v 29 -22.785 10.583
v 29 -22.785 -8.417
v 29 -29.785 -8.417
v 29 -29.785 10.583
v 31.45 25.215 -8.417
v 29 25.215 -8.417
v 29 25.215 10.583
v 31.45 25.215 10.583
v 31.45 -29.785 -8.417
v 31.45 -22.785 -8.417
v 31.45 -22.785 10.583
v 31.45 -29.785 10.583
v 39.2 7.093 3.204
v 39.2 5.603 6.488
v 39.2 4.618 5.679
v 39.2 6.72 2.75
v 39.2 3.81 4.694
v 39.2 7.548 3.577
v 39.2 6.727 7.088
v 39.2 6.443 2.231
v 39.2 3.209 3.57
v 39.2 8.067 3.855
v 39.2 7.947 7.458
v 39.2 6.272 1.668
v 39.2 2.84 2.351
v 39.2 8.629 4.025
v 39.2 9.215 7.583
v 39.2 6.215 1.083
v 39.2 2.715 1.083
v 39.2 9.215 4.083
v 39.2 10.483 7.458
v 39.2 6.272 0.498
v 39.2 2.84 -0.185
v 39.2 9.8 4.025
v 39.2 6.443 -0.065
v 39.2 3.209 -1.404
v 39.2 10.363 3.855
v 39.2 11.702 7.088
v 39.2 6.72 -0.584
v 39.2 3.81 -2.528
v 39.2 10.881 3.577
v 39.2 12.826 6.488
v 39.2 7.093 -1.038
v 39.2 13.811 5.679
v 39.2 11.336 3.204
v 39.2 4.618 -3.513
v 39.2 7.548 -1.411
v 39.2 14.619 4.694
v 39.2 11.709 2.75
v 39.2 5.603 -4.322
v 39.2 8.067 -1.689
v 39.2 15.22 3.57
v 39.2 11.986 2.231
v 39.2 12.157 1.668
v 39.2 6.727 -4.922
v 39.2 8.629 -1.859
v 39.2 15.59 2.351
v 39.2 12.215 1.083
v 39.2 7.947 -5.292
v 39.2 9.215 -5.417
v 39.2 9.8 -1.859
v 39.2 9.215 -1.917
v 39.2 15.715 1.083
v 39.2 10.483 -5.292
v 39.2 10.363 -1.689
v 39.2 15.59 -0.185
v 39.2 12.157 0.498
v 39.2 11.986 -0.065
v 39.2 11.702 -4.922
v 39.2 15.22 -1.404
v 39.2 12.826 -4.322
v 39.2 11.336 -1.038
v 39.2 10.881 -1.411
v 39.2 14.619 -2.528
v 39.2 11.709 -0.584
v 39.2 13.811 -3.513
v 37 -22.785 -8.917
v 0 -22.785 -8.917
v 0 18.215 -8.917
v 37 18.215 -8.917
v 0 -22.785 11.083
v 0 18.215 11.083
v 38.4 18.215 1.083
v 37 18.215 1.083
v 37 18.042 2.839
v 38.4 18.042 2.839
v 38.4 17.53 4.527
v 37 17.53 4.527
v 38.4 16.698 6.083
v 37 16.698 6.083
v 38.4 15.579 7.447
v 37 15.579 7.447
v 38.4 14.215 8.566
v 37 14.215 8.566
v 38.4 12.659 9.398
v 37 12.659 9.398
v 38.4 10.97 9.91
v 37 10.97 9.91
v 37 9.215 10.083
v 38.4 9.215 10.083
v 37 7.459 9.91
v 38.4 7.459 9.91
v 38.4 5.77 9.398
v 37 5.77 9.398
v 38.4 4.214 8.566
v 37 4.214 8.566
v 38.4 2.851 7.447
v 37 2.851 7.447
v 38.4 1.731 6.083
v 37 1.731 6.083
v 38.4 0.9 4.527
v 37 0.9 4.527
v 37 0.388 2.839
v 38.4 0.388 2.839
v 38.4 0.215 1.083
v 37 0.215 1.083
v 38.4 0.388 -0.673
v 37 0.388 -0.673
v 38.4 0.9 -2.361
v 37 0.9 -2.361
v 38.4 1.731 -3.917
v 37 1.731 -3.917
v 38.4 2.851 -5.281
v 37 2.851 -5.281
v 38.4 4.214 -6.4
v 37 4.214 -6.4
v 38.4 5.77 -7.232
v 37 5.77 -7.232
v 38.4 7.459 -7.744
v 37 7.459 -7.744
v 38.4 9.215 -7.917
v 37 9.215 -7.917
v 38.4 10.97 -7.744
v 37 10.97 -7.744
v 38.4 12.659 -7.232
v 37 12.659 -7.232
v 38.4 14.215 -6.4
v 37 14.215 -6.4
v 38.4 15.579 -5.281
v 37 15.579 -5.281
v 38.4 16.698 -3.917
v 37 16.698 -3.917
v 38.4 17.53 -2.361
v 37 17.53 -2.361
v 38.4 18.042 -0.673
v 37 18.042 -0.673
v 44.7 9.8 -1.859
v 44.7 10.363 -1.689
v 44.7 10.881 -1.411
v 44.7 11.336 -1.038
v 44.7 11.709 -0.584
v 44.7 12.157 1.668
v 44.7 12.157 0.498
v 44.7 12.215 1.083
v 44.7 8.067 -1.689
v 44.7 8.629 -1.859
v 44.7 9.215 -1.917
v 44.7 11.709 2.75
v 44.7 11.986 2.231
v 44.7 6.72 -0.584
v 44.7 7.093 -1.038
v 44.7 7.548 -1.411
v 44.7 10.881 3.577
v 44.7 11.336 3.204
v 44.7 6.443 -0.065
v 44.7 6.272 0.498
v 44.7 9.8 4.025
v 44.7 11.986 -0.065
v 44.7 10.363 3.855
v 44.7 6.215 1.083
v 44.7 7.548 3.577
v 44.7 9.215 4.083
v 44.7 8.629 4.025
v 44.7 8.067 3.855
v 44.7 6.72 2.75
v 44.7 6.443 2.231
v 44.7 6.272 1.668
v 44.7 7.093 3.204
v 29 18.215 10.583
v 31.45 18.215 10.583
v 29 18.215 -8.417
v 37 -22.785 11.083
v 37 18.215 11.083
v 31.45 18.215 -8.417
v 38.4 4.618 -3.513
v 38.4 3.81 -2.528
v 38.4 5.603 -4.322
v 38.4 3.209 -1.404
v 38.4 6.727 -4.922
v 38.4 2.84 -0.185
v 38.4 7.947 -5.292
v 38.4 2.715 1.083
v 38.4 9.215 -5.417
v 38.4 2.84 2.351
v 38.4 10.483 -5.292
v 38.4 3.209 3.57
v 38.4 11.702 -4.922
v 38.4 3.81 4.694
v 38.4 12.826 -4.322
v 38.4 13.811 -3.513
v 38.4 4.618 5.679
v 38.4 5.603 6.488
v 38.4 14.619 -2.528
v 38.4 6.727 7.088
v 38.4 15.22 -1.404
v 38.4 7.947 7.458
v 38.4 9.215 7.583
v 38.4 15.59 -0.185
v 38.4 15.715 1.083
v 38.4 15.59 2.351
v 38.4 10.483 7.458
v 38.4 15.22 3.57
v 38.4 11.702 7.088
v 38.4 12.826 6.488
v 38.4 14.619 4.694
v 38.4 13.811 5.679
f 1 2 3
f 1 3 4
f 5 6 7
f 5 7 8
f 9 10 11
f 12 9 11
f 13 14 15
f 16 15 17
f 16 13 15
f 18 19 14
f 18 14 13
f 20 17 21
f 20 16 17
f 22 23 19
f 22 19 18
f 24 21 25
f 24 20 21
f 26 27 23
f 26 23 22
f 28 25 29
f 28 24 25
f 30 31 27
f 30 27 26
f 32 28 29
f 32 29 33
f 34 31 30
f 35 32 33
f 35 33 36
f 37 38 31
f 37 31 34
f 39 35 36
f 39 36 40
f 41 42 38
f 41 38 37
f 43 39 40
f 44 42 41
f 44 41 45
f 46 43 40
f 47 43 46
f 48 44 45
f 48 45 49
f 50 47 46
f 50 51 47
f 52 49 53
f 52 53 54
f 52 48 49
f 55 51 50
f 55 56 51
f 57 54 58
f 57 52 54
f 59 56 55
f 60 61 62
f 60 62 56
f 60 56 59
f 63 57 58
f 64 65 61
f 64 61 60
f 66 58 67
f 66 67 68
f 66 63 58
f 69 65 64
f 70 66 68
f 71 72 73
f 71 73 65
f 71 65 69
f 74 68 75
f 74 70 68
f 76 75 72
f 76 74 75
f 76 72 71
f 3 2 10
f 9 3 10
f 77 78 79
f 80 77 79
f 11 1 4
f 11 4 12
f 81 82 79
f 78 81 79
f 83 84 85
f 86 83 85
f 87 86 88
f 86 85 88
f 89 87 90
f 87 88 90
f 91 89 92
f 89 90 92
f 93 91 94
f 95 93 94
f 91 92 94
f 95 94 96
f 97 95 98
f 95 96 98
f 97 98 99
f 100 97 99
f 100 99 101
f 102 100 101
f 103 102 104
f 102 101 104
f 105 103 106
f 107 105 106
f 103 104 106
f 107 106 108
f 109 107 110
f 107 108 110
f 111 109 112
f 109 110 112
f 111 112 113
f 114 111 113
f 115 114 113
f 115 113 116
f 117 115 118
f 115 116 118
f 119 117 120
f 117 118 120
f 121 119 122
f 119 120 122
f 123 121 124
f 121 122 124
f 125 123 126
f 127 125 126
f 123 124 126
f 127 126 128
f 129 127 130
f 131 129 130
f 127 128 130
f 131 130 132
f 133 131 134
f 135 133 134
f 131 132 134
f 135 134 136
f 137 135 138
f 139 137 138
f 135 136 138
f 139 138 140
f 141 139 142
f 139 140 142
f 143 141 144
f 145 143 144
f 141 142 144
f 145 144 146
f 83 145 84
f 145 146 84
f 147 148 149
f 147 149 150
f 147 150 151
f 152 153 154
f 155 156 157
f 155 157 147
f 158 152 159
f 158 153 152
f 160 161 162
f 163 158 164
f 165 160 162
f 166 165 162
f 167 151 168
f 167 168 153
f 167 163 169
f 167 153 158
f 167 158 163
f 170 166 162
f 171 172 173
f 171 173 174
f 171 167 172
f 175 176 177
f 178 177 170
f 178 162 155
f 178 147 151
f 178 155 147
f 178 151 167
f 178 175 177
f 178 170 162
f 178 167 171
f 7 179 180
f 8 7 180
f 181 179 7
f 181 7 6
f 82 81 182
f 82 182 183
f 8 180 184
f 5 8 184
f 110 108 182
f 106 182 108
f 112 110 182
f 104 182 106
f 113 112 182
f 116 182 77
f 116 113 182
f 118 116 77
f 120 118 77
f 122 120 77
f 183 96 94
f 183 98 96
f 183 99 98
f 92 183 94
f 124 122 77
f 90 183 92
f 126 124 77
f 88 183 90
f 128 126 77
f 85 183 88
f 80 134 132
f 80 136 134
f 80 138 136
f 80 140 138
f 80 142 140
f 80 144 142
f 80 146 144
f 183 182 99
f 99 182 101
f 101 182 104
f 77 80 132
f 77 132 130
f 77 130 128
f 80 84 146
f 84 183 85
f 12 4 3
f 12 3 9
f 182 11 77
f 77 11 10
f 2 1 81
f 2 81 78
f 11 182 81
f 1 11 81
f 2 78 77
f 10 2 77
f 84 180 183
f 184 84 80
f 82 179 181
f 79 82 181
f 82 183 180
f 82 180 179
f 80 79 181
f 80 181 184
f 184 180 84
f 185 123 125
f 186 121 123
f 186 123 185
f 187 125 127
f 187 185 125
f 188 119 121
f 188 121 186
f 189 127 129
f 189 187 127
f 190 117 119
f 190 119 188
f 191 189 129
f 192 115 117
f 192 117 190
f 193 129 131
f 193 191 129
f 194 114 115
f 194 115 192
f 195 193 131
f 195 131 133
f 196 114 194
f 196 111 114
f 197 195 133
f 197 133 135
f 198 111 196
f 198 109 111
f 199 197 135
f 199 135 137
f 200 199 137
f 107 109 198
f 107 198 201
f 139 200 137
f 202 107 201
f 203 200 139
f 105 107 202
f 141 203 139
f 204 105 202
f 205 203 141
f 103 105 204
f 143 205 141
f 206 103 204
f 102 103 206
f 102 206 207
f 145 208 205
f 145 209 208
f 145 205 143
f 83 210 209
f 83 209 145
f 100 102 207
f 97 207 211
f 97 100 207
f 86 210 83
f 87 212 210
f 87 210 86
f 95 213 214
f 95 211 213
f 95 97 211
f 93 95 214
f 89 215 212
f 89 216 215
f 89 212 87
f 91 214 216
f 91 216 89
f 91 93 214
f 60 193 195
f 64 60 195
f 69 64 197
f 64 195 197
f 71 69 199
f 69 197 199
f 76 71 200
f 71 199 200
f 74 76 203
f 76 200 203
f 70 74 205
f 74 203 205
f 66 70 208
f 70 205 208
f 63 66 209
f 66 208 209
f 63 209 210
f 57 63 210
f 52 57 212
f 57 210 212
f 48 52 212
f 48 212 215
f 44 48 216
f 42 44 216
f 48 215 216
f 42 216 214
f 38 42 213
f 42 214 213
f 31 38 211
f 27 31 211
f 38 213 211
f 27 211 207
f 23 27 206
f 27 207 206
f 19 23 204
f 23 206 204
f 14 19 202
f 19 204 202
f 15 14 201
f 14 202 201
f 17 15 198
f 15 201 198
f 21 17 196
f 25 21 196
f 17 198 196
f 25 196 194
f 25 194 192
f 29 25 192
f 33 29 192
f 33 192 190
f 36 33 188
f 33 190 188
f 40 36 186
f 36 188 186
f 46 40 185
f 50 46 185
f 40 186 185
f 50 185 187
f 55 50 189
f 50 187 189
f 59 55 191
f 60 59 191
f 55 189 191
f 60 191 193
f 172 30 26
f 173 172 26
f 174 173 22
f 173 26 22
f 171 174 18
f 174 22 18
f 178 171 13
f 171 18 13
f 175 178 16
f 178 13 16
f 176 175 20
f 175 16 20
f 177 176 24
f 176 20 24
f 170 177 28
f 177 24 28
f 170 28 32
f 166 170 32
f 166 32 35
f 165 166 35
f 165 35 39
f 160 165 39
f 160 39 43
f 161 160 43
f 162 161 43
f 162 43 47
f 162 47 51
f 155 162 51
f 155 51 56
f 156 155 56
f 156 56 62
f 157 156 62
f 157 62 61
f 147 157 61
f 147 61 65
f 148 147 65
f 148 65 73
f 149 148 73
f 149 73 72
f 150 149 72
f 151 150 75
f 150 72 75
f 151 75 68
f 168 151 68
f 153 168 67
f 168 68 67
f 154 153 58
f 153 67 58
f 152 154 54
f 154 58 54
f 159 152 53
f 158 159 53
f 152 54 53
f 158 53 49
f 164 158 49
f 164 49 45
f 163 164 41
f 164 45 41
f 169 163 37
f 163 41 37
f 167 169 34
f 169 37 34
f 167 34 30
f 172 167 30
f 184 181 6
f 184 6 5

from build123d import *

# Parameters (mm, degrees)
SKETCH_1_W      = 20
SKETCH_1_H      = 41
EXTRUDE_1_DEPTH = 37
SKETCH_2_W      = 2.45
SKETCH_2_H      = 19
EXTRUDE_2_DEPTH = 7
SKETCH_3_W      = 2.45
SKETCH_3_H      = 19
EXTRUDE_3_DEPTH = 7
SKETCH_4_R      = 3
EXTRUDE_4_DEPTH = 7.7
SKETCH_5_R      = 9
EXTRUDE_5_DEPTH = 1.4
SKETCH_7_R      = 6.5
EXTRUDE_6_DEPTH = 0.8


with BuildPart() as part:
    # 草圖1 → 填料-伸長1 (new body)
    with BuildSketch(Plane(origin=(0, 0, 0), x_dir=(0, 0, -1), z_dir=(1, 0, 0))):
        with Locations((-1.083039195, -2.285391089)):
            Rectangle(SKETCH_1_W, SKETCH_1_H)
    extrude(amount=EXTRUDE_1_DEPTH)

    # 草圖2 → 填料-伸長2 (add)
    with BuildSketch(Plane(origin=(0, 18.214608911, 0), x_dir=(1, 0, 0), z_dir=(0, 1, 0))):
        with Locations((30.225, -1.083039195)):
            Rectangle(SKETCH_2_W, SKETCH_2_H)
    extrude(amount=EXTRUDE_2_DEPTH)

    # 草圖3 → 填料-伸長3 (add)
    with BuildSketch(Plane.XZ.offset(22.785391089)):
        with Locations((30.225, 1.083039195)):
            Rectangle(SKETCH_3_W, SKETCH_3_H)
    extrude(amount=EXTRUDE_3_DEPTH)

    # 草圖4 → 填料-伸長4 (add)
    with BuildSketch(Plane(origin=(37, 0, 0), x_dir=(0, 0, -1), z_dir=(1, 0, 0))):
        with Locations(Location((-1.083039195, 9.214608911, 0), (0, 0, 180))):
            Circle(SKETCH_4_R)
    extrude(amount=EXTRUDE_4_DEPTH)

    # 草圖5 → 填料-伸長5 (add)
    with BuildSketch(Plane(origin=(37, 0, 0), x_dir=(0, 0, -1), z_dir=(1, 0, 0))):
        with Locations(Location((-1.083039195, 9.214608911, 0), (0, 0, 90))):
            Circle(SKETCH_5_R)
    extrude(amount=EXTRUDE_5_DEPTH)

    # 草圖7 → 填料-伸長6 (add)
    with BuildSketch(Plane(origin=(38.4, 0, 0), x_dir=(0, 0, -1), z_dir=(1, 0, 0))):
        with Locations((-1.083039195, 9.214608911)):
            Circle(SKETCH_7_R)
    extrude(amount=EXTRUDE_6_DEPTH)


solid = part.part
